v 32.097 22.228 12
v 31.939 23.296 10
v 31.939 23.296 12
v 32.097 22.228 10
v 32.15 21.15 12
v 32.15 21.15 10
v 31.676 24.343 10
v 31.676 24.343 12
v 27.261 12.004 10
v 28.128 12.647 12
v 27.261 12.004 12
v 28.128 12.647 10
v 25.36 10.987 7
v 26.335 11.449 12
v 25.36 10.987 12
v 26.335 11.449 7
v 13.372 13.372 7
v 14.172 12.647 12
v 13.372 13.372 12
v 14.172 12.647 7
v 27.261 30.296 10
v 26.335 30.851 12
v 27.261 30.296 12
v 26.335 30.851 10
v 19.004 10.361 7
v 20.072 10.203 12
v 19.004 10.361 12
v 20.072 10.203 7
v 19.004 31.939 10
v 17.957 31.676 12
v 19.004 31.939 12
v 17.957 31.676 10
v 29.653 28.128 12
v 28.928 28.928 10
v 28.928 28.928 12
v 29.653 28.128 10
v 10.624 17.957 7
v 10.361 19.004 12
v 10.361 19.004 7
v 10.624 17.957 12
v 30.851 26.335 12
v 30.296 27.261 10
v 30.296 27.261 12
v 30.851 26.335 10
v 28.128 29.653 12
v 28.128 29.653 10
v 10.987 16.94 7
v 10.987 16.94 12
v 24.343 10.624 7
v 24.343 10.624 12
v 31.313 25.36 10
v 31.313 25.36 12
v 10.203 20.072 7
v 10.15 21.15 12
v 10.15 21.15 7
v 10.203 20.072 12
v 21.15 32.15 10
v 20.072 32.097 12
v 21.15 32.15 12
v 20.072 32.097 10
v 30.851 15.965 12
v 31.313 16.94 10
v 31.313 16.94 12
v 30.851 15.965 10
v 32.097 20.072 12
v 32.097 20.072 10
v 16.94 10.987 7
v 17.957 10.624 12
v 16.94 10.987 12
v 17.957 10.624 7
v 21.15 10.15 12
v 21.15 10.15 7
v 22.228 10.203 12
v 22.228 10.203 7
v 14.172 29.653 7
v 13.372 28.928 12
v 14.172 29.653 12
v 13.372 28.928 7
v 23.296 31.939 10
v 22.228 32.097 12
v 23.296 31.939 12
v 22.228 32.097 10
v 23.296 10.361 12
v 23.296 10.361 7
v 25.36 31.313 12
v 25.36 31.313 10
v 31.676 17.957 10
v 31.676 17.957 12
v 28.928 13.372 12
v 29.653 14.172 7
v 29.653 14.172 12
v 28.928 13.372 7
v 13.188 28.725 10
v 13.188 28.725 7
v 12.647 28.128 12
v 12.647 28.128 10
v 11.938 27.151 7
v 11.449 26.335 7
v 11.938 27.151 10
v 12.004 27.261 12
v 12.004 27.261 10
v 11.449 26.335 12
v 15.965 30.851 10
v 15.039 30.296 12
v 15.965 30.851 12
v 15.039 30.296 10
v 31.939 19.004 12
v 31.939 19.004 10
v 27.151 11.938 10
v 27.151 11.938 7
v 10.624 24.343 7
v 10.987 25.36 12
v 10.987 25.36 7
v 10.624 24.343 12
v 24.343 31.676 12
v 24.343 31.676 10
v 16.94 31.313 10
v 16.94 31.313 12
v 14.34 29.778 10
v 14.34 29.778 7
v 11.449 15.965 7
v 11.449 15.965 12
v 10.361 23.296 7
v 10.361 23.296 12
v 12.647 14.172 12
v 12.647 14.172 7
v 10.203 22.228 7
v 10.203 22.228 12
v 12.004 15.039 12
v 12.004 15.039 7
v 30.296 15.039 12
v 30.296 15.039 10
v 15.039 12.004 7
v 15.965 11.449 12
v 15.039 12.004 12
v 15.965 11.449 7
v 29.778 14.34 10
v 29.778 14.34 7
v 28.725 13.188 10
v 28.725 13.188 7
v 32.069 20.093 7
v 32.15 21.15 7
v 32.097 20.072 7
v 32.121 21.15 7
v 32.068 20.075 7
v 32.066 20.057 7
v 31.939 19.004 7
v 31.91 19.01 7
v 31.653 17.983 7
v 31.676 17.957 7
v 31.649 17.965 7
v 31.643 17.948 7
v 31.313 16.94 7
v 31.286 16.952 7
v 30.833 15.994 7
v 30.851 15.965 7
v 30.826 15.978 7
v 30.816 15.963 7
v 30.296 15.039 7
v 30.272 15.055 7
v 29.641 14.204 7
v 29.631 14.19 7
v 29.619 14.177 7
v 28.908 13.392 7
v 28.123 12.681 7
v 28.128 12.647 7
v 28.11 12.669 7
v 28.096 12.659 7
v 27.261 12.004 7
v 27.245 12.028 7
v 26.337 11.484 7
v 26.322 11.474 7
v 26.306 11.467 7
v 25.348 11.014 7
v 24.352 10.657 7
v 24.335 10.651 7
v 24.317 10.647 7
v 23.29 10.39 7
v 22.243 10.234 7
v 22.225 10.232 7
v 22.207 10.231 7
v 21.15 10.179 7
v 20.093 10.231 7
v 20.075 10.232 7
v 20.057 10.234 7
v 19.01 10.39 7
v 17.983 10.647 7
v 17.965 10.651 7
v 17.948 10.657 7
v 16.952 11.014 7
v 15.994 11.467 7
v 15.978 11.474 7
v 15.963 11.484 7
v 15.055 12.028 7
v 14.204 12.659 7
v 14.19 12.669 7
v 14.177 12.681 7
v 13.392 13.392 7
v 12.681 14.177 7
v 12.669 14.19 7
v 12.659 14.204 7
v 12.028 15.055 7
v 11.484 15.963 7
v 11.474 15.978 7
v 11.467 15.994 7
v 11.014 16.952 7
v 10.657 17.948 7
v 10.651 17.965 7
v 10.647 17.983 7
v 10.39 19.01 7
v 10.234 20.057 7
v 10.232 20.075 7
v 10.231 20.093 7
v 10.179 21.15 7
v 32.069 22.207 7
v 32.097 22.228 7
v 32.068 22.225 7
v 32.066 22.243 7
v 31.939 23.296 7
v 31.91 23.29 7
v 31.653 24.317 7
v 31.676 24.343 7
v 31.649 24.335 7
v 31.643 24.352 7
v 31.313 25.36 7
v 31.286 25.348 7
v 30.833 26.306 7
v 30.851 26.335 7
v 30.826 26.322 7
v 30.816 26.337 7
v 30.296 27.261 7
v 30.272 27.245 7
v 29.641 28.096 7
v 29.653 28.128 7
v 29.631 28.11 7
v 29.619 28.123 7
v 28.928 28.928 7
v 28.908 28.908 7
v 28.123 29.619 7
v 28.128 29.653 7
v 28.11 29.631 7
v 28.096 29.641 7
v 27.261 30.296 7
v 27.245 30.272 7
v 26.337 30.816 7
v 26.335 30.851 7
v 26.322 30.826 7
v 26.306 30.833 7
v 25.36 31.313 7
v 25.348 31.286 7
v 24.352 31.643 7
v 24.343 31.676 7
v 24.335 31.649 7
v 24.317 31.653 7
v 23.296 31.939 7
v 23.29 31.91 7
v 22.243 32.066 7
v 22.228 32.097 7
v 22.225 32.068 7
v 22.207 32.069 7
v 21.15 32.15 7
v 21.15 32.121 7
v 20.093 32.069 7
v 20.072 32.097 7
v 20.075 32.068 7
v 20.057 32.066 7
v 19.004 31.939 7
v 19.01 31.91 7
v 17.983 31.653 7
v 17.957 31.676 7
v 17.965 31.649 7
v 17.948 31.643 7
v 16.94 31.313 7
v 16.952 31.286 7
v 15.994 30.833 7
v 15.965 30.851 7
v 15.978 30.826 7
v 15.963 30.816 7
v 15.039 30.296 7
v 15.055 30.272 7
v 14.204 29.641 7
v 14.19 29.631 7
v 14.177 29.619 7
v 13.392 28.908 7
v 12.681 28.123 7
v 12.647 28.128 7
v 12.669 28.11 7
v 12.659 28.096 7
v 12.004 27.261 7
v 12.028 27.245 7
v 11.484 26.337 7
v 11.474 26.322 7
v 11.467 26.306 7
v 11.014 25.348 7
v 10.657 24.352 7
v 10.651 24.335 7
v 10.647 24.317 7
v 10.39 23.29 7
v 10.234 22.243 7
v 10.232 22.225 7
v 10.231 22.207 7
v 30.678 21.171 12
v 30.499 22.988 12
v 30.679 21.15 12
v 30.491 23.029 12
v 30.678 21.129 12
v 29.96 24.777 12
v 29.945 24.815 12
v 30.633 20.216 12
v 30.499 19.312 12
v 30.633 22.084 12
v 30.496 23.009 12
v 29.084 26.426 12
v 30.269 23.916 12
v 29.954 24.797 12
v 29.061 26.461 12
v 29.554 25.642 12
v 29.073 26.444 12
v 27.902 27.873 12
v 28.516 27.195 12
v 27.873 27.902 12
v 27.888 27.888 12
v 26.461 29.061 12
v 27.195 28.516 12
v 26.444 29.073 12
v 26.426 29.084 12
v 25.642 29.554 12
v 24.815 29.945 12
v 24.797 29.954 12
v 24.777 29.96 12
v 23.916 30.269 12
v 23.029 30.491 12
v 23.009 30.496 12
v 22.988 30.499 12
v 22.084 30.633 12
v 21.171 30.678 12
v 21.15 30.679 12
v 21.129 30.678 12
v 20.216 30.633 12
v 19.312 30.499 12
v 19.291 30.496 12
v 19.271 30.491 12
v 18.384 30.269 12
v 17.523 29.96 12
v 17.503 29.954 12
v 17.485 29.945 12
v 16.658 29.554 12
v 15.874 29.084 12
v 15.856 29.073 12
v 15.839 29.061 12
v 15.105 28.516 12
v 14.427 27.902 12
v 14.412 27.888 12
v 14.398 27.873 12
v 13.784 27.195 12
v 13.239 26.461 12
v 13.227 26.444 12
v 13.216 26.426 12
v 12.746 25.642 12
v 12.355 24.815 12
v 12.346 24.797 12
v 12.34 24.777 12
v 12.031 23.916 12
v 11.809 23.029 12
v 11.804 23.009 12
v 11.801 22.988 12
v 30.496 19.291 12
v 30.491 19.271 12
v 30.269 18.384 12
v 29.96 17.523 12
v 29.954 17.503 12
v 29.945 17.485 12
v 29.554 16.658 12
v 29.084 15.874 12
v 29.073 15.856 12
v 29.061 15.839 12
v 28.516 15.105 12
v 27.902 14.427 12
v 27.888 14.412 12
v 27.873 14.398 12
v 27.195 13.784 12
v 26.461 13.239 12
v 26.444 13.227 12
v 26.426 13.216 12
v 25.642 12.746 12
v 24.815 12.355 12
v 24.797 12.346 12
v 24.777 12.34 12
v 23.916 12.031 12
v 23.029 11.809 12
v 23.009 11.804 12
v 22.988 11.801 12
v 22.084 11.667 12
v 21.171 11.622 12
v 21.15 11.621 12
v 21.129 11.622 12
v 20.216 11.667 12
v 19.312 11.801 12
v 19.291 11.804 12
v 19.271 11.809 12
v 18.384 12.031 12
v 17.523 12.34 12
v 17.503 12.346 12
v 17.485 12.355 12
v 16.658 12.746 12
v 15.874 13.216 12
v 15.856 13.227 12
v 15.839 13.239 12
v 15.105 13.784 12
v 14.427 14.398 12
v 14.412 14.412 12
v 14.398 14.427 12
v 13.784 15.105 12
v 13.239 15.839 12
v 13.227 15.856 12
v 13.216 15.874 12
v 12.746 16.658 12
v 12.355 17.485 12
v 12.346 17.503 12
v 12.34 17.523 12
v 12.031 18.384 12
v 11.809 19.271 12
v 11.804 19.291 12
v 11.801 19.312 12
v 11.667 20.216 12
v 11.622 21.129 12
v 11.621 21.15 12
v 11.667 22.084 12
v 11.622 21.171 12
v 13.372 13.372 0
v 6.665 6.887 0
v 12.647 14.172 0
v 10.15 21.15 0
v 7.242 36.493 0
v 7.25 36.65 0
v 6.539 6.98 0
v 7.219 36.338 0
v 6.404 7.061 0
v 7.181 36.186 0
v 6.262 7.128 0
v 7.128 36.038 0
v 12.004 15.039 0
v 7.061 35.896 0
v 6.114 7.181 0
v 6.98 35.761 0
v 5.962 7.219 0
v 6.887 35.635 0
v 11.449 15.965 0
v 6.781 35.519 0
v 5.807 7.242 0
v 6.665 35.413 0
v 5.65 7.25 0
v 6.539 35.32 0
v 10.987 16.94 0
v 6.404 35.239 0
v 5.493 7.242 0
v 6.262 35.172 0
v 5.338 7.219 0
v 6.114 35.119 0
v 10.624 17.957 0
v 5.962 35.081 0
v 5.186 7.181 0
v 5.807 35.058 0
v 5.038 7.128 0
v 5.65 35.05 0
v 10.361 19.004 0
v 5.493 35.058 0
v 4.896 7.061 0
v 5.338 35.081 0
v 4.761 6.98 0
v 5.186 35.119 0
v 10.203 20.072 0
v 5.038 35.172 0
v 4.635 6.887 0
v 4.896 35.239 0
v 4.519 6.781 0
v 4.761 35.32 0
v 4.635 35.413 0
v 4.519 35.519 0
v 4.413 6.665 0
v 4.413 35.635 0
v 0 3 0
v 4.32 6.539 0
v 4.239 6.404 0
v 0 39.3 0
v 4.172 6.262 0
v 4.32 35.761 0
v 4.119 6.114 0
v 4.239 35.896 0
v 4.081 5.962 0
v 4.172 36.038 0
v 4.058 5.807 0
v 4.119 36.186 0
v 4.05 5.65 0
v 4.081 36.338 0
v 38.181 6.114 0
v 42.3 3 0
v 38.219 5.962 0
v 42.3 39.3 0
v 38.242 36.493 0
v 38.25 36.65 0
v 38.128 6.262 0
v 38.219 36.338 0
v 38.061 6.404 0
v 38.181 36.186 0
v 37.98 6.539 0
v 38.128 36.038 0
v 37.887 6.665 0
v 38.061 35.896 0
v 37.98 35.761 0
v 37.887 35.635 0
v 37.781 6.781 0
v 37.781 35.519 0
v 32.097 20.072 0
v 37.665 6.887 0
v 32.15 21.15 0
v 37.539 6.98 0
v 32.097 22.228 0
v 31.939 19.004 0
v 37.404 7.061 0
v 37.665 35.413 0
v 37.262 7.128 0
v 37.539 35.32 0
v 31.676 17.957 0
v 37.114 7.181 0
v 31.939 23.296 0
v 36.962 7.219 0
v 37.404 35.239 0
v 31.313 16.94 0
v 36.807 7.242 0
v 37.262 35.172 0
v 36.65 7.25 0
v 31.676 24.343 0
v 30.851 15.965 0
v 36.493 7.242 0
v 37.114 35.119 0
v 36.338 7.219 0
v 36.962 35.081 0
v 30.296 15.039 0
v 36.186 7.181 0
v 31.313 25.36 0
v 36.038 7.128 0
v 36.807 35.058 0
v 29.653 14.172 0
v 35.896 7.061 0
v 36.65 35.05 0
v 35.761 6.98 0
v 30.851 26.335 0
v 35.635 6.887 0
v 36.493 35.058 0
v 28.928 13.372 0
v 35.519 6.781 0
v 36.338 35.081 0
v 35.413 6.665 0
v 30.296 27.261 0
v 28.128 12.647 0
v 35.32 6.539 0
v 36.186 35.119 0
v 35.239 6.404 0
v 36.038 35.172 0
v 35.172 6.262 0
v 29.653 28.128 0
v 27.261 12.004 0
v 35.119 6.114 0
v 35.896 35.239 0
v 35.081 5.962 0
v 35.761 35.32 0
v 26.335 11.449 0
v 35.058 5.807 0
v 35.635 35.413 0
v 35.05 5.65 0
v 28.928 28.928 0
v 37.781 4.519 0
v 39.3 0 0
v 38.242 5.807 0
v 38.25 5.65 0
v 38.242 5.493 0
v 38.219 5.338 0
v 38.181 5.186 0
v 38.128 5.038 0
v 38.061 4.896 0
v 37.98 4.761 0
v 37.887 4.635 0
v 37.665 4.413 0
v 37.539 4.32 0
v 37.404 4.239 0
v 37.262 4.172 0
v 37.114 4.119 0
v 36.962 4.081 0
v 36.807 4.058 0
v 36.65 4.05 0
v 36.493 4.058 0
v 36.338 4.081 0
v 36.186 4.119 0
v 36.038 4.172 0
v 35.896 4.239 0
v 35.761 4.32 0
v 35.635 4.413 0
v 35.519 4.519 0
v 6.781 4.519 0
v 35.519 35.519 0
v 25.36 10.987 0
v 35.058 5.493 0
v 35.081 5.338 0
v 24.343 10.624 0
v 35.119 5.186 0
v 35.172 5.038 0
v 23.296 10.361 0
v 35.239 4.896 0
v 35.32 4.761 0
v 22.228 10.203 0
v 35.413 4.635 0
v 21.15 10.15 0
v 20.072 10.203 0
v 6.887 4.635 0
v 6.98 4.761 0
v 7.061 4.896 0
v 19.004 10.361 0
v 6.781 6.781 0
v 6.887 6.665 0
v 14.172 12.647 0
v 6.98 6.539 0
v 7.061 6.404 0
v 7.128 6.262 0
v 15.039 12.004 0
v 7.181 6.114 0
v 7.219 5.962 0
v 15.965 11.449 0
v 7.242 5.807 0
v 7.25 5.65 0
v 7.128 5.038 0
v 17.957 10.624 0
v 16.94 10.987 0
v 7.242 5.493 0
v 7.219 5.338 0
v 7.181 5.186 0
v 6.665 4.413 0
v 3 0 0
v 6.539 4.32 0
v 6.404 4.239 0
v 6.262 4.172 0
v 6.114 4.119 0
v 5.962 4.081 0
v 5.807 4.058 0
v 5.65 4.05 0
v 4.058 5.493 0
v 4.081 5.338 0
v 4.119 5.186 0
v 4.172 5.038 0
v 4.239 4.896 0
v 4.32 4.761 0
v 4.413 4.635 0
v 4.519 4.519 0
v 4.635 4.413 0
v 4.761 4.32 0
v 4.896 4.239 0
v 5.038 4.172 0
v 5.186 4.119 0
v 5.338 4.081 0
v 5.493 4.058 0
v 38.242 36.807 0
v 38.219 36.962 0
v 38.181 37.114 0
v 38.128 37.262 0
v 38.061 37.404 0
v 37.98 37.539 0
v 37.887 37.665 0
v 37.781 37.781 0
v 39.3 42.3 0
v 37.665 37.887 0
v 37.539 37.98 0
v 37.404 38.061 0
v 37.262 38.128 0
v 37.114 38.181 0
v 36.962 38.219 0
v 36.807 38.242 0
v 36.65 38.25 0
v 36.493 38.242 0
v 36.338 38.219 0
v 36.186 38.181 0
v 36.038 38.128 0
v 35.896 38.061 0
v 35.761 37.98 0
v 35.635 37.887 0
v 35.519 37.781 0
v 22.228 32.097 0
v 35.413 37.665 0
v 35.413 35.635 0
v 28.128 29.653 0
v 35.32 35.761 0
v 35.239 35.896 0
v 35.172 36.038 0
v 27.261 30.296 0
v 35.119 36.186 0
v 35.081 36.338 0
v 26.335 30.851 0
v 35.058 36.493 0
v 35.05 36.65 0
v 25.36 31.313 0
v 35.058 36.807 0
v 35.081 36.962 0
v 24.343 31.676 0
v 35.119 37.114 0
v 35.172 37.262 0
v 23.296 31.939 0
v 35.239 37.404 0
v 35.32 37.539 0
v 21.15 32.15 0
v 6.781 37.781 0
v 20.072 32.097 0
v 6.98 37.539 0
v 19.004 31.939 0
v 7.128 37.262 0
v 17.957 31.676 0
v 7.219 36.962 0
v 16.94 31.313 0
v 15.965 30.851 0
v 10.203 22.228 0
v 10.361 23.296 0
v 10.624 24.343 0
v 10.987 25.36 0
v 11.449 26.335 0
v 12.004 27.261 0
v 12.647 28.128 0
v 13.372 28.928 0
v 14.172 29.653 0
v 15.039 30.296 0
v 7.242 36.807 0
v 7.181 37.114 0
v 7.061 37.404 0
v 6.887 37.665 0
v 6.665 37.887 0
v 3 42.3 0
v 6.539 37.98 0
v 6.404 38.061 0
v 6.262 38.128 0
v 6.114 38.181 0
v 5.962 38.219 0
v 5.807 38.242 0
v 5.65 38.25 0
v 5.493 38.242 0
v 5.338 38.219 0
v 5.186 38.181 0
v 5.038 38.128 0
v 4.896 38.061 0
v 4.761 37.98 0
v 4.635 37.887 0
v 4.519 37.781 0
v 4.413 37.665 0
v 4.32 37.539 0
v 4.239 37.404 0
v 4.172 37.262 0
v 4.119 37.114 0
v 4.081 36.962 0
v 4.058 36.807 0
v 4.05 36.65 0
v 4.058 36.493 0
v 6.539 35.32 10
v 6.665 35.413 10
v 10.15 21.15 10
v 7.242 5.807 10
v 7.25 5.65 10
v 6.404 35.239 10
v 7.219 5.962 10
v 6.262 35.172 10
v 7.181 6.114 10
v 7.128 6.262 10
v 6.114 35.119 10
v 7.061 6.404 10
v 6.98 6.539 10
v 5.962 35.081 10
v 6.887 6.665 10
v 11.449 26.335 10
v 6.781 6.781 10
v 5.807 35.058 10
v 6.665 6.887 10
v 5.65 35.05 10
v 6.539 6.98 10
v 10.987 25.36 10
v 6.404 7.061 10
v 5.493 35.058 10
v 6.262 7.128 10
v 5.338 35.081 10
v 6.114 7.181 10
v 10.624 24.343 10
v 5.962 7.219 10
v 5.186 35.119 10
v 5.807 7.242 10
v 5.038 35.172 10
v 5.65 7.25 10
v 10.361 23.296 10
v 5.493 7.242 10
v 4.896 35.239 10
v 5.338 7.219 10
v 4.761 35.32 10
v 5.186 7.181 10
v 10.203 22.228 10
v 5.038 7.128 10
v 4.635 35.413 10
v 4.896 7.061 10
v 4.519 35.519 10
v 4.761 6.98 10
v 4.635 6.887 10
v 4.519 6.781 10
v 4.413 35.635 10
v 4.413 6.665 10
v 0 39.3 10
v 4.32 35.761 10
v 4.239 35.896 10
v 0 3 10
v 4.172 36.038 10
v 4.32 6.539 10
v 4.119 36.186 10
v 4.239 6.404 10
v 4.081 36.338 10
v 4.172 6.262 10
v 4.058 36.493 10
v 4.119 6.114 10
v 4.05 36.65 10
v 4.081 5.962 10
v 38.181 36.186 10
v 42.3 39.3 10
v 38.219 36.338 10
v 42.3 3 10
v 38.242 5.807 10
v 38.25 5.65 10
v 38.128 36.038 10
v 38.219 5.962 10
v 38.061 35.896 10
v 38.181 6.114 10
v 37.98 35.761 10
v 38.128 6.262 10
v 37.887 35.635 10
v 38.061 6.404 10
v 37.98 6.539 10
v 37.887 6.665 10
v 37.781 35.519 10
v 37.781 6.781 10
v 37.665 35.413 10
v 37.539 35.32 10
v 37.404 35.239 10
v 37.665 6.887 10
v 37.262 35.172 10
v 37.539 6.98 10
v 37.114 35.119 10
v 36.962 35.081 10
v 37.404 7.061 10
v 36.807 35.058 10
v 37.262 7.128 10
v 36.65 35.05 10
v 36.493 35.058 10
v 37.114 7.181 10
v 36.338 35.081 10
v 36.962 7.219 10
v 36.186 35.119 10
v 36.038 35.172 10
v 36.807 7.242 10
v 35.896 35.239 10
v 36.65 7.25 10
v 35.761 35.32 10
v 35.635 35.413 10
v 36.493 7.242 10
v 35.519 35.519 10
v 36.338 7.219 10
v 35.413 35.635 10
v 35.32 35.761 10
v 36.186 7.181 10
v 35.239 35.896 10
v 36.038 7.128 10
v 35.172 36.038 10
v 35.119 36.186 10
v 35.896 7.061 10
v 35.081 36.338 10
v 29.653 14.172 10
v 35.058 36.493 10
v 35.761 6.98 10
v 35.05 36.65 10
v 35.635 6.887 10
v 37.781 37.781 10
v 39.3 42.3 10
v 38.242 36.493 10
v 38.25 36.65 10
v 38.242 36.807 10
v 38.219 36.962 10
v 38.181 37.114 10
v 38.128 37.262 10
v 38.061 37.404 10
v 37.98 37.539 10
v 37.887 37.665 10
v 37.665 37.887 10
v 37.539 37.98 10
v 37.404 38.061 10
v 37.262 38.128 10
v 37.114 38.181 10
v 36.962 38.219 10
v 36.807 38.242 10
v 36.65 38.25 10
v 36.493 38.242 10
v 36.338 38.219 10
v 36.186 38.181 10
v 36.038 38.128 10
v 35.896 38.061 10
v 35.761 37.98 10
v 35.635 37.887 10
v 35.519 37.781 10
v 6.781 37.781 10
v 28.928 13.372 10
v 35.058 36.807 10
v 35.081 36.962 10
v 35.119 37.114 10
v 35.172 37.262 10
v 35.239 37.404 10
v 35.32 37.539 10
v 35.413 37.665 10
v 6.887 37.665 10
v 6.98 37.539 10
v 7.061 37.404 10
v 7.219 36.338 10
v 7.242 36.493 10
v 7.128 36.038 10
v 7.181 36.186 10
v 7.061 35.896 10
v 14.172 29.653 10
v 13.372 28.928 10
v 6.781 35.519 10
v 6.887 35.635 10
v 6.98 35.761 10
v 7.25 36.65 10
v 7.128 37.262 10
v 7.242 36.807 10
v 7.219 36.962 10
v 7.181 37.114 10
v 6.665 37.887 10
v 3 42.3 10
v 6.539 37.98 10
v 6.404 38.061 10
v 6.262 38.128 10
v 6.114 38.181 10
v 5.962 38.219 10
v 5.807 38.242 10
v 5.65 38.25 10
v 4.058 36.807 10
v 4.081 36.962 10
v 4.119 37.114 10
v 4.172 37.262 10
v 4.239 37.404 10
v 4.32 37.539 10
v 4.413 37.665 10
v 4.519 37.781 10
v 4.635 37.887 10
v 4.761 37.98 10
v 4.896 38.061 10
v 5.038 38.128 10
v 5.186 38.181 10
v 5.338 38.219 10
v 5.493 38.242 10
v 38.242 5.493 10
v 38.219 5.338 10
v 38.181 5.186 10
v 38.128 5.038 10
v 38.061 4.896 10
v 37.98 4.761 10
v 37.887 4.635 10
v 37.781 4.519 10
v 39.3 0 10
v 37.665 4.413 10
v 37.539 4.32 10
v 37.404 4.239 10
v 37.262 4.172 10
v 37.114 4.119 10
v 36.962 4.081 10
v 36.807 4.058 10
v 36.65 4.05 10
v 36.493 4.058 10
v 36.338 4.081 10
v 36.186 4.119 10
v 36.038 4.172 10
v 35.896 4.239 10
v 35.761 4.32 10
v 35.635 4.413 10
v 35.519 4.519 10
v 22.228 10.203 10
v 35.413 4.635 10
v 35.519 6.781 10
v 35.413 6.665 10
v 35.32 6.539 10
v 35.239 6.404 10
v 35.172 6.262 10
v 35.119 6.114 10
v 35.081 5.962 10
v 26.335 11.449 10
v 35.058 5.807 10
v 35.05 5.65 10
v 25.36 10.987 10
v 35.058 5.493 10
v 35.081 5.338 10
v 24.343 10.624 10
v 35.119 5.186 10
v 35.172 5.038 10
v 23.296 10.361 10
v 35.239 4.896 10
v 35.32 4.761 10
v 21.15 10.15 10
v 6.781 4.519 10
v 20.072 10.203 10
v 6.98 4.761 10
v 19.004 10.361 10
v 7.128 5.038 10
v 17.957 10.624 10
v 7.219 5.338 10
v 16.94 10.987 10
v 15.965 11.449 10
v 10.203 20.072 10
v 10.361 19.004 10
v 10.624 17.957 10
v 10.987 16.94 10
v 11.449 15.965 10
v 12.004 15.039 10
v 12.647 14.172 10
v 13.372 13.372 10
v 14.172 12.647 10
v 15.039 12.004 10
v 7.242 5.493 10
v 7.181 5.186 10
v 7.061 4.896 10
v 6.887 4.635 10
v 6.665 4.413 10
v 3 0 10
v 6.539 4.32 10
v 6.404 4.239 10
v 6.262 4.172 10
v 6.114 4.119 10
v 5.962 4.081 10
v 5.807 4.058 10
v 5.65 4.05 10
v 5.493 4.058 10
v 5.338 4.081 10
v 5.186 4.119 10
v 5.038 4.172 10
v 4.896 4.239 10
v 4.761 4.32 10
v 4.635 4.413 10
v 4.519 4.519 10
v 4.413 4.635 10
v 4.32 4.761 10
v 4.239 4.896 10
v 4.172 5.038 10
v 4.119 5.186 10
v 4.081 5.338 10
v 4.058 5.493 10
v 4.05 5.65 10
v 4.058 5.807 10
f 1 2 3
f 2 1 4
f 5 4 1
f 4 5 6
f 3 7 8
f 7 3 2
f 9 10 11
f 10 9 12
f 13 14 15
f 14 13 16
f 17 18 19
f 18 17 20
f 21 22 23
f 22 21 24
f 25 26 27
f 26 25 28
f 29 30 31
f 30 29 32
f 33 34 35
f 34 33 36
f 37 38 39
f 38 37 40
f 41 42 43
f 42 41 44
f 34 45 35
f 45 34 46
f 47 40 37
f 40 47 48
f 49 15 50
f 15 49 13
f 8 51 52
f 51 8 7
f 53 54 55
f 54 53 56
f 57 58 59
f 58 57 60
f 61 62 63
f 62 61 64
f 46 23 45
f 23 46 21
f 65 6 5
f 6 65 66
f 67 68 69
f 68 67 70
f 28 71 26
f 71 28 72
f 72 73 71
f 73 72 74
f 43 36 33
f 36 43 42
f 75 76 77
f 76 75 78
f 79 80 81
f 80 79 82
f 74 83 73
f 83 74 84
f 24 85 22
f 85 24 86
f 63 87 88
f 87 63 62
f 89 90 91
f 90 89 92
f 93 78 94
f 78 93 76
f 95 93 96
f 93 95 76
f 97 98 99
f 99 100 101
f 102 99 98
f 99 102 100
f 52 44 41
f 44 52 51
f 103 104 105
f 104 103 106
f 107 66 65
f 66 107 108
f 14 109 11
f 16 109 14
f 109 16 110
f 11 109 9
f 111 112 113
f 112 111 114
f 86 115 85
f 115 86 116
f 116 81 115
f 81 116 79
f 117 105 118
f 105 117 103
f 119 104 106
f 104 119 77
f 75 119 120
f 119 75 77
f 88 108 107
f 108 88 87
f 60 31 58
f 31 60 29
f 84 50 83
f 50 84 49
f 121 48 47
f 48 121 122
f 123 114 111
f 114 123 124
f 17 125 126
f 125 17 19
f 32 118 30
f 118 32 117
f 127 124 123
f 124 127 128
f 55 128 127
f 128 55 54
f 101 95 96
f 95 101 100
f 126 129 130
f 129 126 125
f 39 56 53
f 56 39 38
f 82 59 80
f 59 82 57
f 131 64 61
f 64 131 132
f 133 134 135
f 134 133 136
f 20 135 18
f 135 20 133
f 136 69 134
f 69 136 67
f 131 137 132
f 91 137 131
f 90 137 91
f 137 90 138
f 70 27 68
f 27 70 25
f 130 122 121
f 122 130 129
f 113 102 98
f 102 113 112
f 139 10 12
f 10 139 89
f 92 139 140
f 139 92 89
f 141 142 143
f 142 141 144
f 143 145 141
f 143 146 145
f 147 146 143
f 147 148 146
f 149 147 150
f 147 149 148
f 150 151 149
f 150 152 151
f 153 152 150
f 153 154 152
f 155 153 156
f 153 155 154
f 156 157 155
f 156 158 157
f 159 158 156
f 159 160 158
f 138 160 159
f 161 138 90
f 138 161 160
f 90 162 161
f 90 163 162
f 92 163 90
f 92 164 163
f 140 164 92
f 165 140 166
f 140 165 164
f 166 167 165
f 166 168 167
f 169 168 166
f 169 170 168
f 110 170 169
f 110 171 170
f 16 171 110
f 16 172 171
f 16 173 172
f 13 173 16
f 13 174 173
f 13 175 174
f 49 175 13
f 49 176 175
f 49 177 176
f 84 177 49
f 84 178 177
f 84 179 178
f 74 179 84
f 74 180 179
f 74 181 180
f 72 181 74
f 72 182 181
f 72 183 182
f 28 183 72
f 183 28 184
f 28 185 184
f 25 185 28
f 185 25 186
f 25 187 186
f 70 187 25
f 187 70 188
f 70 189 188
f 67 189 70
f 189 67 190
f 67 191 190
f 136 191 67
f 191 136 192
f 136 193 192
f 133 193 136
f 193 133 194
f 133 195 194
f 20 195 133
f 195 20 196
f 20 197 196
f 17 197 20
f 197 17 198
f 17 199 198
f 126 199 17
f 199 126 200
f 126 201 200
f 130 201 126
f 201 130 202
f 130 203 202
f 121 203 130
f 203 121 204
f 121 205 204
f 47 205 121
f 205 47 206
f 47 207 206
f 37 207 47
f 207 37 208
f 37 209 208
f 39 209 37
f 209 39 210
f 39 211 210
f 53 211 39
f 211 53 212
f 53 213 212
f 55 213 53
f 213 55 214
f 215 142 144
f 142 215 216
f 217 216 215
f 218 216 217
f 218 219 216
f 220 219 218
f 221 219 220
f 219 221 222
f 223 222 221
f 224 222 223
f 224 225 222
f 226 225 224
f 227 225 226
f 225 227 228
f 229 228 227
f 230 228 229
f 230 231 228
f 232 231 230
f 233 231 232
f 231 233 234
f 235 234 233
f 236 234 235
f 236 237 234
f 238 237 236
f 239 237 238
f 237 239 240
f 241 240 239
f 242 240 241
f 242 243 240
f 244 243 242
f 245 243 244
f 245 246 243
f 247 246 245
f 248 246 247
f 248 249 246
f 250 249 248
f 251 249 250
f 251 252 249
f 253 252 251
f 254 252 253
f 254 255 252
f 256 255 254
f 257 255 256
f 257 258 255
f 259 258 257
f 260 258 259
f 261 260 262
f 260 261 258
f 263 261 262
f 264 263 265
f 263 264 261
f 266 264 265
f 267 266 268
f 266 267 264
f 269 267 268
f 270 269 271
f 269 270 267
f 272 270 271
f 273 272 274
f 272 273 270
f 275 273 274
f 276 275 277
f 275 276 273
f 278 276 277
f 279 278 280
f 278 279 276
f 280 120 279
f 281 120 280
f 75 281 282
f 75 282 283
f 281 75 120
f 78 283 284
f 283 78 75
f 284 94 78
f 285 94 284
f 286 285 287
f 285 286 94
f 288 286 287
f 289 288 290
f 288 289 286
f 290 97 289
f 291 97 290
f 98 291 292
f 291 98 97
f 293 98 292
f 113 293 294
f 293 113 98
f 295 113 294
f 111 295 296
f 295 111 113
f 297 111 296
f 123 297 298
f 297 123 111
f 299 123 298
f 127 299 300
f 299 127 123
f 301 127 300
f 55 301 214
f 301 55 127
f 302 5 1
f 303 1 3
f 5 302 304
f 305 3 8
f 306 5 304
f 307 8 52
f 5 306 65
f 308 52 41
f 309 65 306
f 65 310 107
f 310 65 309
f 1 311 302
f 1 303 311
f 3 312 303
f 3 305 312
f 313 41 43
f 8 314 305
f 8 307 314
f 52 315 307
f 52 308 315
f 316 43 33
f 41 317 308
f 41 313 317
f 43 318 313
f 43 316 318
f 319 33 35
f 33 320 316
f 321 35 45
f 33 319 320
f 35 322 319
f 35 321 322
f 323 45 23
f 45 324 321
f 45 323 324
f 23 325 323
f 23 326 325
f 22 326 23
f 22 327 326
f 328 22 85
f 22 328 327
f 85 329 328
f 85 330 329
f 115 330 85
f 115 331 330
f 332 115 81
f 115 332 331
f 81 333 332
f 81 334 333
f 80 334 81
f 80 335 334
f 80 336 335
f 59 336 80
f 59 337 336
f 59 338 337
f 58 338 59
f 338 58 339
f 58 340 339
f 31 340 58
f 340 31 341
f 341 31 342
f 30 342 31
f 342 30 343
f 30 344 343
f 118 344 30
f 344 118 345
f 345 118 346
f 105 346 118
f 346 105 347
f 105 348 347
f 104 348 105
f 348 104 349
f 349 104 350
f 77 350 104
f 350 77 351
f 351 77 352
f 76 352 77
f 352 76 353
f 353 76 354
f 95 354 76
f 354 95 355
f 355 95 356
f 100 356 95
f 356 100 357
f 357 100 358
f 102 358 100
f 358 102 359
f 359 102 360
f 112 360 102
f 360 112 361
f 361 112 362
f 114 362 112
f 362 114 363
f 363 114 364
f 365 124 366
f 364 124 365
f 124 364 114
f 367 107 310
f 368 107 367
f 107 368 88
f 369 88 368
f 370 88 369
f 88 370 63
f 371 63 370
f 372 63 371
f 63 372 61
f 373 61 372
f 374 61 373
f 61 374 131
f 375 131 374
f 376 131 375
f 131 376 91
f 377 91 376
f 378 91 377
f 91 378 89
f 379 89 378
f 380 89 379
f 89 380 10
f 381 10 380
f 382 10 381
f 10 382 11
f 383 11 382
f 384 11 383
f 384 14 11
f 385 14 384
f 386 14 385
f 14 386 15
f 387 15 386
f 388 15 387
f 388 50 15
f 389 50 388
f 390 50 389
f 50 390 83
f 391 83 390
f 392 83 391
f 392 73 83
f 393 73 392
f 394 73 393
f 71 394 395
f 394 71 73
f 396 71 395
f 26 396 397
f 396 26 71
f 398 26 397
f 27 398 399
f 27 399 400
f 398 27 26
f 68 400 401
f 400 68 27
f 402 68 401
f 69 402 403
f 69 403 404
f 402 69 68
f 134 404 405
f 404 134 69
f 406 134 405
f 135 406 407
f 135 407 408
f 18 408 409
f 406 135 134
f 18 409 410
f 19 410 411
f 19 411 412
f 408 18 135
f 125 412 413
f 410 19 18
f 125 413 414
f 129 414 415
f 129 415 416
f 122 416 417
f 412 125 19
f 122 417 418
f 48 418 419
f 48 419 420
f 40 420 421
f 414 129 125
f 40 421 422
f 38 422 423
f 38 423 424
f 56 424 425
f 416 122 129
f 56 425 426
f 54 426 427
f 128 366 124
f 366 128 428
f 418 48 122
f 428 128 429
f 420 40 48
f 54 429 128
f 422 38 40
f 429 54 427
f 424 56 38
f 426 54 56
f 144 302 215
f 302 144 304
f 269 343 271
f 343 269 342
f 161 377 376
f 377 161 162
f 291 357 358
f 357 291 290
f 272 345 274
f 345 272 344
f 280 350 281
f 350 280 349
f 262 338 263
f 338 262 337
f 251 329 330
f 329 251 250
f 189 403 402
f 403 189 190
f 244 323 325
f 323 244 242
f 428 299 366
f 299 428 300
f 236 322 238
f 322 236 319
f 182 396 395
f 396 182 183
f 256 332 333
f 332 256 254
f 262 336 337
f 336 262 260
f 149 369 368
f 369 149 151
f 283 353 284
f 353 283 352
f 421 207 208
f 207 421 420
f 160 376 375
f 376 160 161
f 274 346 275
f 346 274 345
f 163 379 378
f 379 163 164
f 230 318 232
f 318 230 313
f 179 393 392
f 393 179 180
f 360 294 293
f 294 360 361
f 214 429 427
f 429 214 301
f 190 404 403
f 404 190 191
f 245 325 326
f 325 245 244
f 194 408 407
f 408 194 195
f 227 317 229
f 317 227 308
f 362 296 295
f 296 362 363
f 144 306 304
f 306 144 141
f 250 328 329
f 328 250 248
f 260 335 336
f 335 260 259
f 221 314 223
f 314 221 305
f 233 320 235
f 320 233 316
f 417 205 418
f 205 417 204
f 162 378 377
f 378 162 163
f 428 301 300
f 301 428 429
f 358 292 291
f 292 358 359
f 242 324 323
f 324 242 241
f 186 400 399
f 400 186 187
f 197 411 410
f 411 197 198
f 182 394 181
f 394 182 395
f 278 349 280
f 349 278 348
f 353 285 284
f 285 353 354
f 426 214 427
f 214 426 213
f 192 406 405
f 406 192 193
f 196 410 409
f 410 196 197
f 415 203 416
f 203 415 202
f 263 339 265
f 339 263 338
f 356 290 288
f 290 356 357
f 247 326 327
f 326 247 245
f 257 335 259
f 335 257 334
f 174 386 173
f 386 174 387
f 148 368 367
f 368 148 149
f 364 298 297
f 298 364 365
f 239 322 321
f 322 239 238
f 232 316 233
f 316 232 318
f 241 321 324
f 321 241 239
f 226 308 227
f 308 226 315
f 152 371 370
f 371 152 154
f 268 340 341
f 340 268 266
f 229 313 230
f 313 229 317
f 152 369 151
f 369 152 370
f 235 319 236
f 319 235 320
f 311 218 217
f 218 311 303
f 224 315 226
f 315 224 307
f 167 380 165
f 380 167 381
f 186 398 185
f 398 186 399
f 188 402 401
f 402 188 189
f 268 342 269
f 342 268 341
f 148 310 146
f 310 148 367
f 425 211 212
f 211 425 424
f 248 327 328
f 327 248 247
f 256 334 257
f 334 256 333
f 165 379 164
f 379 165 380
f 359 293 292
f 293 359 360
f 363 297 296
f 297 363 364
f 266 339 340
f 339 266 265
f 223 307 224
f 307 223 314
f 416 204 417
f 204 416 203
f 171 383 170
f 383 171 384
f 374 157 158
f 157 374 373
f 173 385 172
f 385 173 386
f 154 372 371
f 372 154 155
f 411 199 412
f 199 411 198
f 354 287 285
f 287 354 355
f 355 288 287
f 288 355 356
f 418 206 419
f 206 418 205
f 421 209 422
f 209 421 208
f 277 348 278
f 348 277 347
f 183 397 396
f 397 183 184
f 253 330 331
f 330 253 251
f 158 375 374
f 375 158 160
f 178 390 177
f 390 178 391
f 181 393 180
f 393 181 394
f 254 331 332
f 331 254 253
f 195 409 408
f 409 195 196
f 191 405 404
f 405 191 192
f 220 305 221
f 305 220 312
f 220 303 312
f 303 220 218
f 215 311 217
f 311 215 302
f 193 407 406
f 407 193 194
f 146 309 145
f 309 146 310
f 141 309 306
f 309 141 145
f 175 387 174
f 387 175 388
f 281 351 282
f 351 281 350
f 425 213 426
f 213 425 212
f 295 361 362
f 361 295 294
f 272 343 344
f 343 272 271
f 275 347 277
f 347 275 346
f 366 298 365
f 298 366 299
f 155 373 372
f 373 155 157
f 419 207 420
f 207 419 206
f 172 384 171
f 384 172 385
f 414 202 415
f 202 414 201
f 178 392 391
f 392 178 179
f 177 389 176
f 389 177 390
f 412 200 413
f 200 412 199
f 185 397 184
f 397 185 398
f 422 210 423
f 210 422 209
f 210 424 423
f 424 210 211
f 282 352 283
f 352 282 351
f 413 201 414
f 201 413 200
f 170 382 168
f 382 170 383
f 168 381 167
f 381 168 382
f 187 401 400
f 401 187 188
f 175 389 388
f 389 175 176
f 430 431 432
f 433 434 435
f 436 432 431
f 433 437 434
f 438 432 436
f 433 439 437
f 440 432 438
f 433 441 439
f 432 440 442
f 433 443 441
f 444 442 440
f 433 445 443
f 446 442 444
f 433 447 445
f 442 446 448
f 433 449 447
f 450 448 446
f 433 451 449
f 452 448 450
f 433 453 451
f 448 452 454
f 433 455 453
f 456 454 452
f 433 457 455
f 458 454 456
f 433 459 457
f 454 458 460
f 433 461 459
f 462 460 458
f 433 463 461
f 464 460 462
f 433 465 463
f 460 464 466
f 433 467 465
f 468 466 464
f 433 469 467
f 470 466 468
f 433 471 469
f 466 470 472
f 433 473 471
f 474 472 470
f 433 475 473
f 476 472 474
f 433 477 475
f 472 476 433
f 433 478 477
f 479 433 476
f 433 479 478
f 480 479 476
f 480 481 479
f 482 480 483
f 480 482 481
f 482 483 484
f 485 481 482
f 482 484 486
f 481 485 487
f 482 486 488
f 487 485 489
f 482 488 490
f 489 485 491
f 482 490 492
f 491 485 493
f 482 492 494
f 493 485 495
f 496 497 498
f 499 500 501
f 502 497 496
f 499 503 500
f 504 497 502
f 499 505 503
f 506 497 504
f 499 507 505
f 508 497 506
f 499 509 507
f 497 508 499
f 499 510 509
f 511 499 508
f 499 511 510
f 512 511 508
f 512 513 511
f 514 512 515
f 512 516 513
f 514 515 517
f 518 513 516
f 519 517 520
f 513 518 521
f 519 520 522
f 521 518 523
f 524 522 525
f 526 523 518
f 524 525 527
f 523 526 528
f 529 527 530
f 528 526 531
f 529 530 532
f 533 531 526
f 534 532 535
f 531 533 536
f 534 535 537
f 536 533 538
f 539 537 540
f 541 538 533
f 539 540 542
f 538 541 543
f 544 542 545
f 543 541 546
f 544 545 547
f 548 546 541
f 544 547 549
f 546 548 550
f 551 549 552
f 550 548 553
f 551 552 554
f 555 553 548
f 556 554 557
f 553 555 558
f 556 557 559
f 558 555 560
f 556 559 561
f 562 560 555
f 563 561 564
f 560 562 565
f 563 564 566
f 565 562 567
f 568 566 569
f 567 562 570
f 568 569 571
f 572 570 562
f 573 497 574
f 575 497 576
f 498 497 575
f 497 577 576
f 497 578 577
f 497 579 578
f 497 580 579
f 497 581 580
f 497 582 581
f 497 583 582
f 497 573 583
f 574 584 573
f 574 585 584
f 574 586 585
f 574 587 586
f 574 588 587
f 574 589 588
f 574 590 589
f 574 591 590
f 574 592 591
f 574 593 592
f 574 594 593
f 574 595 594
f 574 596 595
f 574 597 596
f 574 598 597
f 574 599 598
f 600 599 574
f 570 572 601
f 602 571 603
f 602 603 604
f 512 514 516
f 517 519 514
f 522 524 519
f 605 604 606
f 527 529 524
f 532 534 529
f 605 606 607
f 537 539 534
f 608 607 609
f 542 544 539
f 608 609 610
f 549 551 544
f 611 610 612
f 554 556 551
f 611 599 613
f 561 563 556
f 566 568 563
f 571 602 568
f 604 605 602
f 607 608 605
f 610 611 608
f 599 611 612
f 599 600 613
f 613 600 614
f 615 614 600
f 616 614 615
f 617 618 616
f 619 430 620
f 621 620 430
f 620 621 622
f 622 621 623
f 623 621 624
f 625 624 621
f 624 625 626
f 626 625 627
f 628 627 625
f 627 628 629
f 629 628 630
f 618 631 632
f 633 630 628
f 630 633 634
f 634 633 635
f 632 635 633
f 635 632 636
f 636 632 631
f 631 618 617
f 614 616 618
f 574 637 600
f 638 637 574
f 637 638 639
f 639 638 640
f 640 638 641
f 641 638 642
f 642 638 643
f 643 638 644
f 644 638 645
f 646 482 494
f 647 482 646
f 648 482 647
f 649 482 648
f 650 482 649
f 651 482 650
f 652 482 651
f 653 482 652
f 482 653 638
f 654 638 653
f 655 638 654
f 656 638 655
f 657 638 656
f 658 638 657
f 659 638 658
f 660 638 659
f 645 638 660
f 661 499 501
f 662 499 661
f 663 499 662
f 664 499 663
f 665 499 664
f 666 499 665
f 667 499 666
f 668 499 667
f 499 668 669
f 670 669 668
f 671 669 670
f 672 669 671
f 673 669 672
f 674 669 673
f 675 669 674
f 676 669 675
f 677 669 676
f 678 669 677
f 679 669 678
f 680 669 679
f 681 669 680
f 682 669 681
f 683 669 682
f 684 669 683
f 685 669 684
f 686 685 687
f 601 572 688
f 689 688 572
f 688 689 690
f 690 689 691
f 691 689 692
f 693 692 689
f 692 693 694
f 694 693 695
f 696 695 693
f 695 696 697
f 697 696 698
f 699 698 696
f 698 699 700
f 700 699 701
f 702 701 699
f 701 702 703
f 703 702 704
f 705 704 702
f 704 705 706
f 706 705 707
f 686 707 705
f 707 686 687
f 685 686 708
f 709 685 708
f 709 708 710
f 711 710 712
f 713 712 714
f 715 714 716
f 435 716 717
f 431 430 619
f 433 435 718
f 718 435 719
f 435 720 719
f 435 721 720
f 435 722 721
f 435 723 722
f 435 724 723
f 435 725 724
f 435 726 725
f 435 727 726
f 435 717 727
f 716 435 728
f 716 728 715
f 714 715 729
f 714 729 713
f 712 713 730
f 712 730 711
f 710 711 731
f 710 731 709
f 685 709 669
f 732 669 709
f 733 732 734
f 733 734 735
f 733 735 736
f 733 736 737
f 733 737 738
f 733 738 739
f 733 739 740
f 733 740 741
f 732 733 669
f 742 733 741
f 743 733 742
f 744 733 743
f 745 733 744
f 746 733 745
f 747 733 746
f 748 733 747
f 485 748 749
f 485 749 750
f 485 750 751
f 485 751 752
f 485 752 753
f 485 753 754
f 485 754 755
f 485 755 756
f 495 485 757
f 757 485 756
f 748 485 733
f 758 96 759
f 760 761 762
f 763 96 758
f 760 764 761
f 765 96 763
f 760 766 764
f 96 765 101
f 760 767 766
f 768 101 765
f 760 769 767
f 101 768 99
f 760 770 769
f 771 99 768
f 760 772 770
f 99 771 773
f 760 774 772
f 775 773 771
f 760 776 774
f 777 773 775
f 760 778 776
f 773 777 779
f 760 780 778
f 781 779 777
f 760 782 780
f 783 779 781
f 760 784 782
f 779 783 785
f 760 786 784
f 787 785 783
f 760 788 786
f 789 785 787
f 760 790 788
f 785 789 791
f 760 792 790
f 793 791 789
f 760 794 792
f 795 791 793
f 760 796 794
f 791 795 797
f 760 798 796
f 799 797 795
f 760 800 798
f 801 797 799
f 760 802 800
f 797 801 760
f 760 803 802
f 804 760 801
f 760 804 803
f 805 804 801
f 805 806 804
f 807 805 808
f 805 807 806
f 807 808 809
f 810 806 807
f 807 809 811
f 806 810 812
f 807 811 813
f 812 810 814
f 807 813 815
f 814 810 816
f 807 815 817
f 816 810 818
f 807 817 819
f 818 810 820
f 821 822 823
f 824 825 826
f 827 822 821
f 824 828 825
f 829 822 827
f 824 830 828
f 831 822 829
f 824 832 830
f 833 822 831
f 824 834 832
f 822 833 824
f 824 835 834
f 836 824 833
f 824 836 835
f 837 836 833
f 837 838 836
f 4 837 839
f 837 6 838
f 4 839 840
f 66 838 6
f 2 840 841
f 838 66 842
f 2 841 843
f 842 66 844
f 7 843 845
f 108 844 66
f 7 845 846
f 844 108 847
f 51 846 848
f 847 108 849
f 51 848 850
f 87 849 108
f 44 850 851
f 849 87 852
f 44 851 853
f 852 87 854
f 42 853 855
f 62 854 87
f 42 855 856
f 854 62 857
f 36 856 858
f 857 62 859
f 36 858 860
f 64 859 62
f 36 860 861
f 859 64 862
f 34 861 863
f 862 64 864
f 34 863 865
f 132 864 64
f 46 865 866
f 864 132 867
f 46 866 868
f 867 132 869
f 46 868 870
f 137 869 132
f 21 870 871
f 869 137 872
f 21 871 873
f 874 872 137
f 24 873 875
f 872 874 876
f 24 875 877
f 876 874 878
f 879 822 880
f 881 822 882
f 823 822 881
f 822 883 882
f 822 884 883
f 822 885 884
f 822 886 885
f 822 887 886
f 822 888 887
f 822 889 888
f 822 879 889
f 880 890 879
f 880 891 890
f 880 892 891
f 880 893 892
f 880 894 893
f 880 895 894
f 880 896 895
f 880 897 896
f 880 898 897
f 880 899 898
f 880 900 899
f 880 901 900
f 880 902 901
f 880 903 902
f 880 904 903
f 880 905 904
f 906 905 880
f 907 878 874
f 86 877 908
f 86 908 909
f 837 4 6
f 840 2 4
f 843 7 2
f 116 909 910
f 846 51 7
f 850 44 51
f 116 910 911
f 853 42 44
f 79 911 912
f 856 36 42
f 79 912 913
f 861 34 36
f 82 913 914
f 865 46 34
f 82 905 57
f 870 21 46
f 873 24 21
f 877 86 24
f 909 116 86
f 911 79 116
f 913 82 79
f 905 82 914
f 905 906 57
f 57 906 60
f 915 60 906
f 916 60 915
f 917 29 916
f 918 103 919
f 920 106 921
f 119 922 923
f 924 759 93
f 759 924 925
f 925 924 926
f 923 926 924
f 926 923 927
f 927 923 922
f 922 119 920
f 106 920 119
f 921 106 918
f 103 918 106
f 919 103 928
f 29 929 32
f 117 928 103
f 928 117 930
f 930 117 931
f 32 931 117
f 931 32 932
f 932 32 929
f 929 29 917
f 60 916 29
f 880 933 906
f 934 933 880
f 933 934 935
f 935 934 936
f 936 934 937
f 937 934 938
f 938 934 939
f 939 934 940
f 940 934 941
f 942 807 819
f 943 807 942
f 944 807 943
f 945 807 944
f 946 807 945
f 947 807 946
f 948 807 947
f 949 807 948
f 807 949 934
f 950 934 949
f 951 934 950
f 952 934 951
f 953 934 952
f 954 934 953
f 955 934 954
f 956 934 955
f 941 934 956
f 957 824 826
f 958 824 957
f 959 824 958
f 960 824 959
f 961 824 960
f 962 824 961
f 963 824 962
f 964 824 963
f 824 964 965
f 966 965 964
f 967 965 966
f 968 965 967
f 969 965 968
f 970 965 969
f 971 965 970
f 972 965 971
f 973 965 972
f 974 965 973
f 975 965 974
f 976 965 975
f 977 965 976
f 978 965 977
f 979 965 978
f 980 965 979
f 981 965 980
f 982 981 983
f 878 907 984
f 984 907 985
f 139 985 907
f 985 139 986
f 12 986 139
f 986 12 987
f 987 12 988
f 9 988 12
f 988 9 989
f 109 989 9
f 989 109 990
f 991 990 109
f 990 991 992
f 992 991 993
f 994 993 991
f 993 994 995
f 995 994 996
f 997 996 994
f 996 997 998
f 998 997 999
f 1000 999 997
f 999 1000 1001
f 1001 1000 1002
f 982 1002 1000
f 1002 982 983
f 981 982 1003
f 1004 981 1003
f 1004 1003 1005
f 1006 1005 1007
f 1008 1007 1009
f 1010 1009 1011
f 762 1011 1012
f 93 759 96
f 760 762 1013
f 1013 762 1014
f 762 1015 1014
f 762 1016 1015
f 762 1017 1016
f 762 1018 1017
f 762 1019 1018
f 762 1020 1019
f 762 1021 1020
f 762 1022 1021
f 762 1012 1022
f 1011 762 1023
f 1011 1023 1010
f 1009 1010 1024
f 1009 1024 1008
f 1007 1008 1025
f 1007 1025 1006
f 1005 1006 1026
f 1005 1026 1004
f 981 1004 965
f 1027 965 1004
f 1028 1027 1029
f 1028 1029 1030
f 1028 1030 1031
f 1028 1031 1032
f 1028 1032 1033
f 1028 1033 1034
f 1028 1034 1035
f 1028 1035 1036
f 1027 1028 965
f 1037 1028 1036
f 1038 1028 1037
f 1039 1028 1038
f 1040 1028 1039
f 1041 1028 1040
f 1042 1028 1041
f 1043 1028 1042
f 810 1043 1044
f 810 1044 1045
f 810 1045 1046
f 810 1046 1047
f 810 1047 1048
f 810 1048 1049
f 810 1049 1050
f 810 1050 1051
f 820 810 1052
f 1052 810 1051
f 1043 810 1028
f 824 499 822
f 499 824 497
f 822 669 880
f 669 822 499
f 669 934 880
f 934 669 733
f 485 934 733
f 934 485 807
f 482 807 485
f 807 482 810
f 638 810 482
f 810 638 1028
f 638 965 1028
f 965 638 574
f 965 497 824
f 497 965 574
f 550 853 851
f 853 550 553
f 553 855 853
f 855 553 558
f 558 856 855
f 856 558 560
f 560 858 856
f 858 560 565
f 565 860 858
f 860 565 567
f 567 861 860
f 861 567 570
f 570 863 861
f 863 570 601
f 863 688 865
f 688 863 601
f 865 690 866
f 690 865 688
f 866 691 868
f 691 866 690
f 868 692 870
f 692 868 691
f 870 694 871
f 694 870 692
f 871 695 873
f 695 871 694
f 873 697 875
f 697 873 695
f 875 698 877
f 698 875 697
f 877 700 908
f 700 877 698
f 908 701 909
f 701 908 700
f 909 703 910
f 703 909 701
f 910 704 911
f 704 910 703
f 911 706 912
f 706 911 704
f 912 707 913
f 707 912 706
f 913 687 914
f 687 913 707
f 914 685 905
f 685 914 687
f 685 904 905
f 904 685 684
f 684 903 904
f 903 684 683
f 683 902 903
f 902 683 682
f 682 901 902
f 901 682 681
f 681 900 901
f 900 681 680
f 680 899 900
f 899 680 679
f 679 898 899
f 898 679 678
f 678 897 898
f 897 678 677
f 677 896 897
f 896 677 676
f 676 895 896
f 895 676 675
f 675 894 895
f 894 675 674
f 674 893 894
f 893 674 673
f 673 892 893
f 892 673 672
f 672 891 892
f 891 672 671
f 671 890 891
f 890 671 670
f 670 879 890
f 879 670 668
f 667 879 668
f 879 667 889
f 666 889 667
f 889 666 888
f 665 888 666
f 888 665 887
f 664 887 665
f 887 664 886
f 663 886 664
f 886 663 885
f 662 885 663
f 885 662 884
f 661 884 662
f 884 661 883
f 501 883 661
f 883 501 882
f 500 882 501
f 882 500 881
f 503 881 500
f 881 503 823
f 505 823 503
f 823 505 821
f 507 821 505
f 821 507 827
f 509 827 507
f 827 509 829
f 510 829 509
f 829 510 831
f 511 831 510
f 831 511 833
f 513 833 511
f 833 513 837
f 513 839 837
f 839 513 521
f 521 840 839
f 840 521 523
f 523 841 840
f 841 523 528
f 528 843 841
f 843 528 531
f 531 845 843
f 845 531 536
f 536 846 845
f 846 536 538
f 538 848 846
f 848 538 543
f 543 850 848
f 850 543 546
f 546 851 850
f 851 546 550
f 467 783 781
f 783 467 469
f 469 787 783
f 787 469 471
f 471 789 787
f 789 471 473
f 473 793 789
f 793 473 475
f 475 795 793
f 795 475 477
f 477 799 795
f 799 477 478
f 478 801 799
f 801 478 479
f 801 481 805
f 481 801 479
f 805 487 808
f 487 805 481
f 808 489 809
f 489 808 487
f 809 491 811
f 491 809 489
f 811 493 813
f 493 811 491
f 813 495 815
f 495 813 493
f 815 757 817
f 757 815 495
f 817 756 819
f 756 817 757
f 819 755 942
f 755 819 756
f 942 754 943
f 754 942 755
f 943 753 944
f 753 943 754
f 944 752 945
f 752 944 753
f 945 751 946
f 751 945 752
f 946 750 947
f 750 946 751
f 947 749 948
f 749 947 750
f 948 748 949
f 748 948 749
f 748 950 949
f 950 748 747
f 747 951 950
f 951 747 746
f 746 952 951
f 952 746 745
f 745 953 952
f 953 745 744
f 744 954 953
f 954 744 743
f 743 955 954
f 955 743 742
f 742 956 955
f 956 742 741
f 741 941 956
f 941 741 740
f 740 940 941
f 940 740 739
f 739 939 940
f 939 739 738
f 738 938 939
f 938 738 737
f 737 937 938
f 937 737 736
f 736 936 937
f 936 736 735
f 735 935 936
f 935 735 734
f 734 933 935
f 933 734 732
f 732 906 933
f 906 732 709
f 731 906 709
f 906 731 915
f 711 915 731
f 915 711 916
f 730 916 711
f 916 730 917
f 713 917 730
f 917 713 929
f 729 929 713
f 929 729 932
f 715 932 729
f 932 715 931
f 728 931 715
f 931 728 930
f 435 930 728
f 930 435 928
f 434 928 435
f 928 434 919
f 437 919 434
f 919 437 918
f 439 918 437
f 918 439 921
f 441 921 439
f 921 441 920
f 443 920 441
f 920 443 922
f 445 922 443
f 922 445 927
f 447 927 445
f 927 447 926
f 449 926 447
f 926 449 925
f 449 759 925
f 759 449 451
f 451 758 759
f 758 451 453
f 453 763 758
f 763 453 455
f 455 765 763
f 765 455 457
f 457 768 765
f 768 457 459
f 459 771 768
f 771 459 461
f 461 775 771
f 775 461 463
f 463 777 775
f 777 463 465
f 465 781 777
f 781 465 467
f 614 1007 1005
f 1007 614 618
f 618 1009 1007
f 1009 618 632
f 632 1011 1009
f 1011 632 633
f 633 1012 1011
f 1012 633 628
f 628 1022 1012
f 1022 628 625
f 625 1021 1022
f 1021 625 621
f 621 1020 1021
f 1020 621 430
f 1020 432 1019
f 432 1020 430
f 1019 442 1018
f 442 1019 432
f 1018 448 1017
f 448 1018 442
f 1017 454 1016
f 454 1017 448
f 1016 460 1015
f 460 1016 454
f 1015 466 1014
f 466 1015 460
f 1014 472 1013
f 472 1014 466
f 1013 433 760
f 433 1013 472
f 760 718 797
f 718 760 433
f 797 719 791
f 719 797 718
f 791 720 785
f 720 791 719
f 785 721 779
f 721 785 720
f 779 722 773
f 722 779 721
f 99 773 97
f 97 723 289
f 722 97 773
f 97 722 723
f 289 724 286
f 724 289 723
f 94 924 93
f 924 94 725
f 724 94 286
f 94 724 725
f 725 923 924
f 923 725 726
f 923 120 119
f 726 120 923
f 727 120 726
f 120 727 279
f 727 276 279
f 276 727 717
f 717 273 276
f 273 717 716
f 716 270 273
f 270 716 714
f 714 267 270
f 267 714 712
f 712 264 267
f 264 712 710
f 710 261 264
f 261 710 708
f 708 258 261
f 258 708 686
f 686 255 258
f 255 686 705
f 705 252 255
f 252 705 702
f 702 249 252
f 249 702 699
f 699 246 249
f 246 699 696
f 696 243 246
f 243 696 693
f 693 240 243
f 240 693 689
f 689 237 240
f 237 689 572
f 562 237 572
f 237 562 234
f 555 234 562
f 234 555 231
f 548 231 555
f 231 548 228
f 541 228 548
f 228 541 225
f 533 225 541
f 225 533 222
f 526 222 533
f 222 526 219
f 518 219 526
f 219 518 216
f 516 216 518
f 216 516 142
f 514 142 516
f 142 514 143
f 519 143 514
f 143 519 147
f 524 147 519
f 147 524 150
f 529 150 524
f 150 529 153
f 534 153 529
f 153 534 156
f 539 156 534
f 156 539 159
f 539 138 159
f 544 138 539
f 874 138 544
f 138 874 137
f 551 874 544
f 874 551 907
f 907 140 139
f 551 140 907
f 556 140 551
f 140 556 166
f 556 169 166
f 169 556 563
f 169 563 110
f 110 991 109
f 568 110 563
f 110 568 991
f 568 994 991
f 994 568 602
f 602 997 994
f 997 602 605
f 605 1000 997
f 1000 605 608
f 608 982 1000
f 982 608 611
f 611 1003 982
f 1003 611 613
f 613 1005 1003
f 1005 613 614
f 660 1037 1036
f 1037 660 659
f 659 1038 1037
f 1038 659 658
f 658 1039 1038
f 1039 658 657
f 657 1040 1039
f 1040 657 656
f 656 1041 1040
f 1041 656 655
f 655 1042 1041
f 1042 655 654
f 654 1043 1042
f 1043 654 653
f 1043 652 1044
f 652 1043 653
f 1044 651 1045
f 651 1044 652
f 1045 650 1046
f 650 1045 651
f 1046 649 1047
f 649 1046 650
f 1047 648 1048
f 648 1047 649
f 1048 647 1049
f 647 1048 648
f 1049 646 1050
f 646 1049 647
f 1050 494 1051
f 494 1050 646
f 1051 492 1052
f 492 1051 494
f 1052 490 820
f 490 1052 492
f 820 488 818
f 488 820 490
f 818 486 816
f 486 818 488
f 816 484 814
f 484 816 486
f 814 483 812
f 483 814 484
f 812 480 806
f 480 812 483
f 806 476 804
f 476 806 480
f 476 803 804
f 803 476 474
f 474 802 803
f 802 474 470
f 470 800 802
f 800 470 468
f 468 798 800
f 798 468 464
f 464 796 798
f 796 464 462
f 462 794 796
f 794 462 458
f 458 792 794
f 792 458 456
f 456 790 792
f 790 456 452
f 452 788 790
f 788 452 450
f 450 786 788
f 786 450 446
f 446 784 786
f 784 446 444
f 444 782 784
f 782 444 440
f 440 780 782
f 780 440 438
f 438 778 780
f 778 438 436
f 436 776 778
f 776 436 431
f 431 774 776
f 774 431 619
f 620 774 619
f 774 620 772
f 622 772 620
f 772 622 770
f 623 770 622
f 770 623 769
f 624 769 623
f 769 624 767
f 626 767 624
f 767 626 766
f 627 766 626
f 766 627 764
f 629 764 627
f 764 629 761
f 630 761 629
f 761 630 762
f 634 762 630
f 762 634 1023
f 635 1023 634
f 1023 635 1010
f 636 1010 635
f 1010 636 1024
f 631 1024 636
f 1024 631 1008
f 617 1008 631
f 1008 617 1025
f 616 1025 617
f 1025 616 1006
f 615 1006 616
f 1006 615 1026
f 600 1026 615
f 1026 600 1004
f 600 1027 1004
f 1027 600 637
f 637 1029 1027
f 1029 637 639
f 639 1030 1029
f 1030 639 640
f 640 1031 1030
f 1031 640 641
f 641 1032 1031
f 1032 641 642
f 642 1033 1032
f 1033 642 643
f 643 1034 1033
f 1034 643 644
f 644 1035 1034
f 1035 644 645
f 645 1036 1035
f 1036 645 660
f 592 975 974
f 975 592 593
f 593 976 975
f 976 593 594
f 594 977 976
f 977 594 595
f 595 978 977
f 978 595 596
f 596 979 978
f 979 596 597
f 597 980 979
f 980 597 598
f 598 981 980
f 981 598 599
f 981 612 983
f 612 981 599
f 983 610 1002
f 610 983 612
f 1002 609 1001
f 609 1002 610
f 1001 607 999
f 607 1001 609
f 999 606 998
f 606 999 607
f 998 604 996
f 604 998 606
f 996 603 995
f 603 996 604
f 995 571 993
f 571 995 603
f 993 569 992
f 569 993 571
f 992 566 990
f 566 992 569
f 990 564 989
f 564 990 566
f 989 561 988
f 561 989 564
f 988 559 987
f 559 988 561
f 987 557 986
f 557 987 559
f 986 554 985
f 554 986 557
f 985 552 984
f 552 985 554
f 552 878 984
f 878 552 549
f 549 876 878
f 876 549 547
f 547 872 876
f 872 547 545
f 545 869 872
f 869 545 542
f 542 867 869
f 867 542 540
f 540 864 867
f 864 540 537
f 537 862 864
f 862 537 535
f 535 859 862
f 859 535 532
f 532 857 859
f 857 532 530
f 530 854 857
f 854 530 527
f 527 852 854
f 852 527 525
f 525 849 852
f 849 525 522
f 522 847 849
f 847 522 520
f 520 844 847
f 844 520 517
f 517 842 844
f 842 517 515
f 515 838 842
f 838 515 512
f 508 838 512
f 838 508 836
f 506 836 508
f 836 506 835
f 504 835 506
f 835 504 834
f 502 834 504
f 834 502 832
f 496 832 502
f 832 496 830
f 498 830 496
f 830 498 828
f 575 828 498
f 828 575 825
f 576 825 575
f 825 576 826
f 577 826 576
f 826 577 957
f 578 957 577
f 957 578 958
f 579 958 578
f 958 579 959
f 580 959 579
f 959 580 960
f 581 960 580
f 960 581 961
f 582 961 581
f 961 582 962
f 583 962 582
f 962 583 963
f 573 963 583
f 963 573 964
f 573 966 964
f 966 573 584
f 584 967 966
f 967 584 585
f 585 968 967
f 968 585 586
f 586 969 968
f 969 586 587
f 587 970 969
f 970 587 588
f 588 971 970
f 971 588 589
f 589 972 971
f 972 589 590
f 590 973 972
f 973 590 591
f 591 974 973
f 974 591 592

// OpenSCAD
/*
 * Customizable spacer plate for NEMA motors.
 * Change the values to your needs.
 * The outer fit will not be generated, if the height is lower than 5.0mm.
 * (c) 2016 by Roman Buchert (roman.buchert@googlemail.com)
 * This file is licensed by "by-nc-sa"
 */
 
//Height of the distance plate in mm
HEIGHT= 10.0;

//Base size of the stepper motor. 42.3mm on NEMA 17.
BASE_SIZE = 42.3;

//Chamfer of the stepper motor. Something about 3mm on a NEMA 17.
BASE_CHAMFER = 3.0;

//Distance of the mounting hole of the stepper motor. 31mm on NEMA 17.
HOLE_DISTANCE = 31.0;

//Size of the mounting hole of the stepper motor. M3 on NEMA 17, so the hole should be something about 3.2mm.
HOLE_DIAMETER = 3.2;

//Size of the mounting fit. 22mm on NEMA 17.
FIT_DIAMETER = 22.0;

//Shape of the base plate.
module plate(){
    //Outline
    P = [
        0,
        BASE_CHAMFER,
        (BASE_SIZE - BASE_CHAMFER),
        BASE_SIZE,
    ];
    //Mounting holes
    H = [ 
        (BASE_SIZE - HOLE_DISTANCE) / 2.0,
        BASE_SIZE - ((BASE_SIZE - HOLE_DISTANCE) / 2.0)
    ];
    
    //Points of the base shape
    baseshape=[ 
        [P[1], P[0]],
        [P[2], P[0]],
        [P[3], P[1]],
        [P[3], P[2]],
        [P[2], P[3]],
        [P[1], P[3]],
        [P[0], P[2]],
        [P[0], P[1]],
        [P[1], P[0]]
    ];
    // cut out holes
    difference(){
        polygon(baseshape);
        translate([H[0], H[0], 0]){
            circle(d = HOLE_DIAMETER);
        }
        translate([H[1], H[0], 0]){
            circle(d = HOLE_DIAMETER);
        }
        translate([H[1], H[1], 0]){
            circle(d = HOLE_DIAMETER);
        }
        translate([H[0], H[1], 0]){
            circle(d = HOLE_DIAMETER);
        }
        translate([BASE_SIZE / 2.0, BASE_SIZE / 2.0, 0])
        {
            circle(d = FIT_DIAMETER);
        }
    }
}

module mounting_fit(){
    difference(){
        cylinder(d=FIT_DIAMETER, h = 5.0);
        translate([0, 0, -0.1]){
            cylinder(d1=FIT_DIAMETER , d2 = FIT_DIAMETER - 3.0, h = 5.2);
        }
    }
}

//build it up!
module spacer_plate(){
    union(){
        linear_extrude(HEIGHT){
            plate();
        }
        // the outer fit will not generated if height < 5.0
        if (HEIGHT >= 5.0) {
            translate([BASE_SIZE / 2.0, BASE_SIZE / 2.0, HEIGHT - 3.0]){
                mounting_fit();
            }
        }
    }
}

$fn=64;
spacer_plate();
